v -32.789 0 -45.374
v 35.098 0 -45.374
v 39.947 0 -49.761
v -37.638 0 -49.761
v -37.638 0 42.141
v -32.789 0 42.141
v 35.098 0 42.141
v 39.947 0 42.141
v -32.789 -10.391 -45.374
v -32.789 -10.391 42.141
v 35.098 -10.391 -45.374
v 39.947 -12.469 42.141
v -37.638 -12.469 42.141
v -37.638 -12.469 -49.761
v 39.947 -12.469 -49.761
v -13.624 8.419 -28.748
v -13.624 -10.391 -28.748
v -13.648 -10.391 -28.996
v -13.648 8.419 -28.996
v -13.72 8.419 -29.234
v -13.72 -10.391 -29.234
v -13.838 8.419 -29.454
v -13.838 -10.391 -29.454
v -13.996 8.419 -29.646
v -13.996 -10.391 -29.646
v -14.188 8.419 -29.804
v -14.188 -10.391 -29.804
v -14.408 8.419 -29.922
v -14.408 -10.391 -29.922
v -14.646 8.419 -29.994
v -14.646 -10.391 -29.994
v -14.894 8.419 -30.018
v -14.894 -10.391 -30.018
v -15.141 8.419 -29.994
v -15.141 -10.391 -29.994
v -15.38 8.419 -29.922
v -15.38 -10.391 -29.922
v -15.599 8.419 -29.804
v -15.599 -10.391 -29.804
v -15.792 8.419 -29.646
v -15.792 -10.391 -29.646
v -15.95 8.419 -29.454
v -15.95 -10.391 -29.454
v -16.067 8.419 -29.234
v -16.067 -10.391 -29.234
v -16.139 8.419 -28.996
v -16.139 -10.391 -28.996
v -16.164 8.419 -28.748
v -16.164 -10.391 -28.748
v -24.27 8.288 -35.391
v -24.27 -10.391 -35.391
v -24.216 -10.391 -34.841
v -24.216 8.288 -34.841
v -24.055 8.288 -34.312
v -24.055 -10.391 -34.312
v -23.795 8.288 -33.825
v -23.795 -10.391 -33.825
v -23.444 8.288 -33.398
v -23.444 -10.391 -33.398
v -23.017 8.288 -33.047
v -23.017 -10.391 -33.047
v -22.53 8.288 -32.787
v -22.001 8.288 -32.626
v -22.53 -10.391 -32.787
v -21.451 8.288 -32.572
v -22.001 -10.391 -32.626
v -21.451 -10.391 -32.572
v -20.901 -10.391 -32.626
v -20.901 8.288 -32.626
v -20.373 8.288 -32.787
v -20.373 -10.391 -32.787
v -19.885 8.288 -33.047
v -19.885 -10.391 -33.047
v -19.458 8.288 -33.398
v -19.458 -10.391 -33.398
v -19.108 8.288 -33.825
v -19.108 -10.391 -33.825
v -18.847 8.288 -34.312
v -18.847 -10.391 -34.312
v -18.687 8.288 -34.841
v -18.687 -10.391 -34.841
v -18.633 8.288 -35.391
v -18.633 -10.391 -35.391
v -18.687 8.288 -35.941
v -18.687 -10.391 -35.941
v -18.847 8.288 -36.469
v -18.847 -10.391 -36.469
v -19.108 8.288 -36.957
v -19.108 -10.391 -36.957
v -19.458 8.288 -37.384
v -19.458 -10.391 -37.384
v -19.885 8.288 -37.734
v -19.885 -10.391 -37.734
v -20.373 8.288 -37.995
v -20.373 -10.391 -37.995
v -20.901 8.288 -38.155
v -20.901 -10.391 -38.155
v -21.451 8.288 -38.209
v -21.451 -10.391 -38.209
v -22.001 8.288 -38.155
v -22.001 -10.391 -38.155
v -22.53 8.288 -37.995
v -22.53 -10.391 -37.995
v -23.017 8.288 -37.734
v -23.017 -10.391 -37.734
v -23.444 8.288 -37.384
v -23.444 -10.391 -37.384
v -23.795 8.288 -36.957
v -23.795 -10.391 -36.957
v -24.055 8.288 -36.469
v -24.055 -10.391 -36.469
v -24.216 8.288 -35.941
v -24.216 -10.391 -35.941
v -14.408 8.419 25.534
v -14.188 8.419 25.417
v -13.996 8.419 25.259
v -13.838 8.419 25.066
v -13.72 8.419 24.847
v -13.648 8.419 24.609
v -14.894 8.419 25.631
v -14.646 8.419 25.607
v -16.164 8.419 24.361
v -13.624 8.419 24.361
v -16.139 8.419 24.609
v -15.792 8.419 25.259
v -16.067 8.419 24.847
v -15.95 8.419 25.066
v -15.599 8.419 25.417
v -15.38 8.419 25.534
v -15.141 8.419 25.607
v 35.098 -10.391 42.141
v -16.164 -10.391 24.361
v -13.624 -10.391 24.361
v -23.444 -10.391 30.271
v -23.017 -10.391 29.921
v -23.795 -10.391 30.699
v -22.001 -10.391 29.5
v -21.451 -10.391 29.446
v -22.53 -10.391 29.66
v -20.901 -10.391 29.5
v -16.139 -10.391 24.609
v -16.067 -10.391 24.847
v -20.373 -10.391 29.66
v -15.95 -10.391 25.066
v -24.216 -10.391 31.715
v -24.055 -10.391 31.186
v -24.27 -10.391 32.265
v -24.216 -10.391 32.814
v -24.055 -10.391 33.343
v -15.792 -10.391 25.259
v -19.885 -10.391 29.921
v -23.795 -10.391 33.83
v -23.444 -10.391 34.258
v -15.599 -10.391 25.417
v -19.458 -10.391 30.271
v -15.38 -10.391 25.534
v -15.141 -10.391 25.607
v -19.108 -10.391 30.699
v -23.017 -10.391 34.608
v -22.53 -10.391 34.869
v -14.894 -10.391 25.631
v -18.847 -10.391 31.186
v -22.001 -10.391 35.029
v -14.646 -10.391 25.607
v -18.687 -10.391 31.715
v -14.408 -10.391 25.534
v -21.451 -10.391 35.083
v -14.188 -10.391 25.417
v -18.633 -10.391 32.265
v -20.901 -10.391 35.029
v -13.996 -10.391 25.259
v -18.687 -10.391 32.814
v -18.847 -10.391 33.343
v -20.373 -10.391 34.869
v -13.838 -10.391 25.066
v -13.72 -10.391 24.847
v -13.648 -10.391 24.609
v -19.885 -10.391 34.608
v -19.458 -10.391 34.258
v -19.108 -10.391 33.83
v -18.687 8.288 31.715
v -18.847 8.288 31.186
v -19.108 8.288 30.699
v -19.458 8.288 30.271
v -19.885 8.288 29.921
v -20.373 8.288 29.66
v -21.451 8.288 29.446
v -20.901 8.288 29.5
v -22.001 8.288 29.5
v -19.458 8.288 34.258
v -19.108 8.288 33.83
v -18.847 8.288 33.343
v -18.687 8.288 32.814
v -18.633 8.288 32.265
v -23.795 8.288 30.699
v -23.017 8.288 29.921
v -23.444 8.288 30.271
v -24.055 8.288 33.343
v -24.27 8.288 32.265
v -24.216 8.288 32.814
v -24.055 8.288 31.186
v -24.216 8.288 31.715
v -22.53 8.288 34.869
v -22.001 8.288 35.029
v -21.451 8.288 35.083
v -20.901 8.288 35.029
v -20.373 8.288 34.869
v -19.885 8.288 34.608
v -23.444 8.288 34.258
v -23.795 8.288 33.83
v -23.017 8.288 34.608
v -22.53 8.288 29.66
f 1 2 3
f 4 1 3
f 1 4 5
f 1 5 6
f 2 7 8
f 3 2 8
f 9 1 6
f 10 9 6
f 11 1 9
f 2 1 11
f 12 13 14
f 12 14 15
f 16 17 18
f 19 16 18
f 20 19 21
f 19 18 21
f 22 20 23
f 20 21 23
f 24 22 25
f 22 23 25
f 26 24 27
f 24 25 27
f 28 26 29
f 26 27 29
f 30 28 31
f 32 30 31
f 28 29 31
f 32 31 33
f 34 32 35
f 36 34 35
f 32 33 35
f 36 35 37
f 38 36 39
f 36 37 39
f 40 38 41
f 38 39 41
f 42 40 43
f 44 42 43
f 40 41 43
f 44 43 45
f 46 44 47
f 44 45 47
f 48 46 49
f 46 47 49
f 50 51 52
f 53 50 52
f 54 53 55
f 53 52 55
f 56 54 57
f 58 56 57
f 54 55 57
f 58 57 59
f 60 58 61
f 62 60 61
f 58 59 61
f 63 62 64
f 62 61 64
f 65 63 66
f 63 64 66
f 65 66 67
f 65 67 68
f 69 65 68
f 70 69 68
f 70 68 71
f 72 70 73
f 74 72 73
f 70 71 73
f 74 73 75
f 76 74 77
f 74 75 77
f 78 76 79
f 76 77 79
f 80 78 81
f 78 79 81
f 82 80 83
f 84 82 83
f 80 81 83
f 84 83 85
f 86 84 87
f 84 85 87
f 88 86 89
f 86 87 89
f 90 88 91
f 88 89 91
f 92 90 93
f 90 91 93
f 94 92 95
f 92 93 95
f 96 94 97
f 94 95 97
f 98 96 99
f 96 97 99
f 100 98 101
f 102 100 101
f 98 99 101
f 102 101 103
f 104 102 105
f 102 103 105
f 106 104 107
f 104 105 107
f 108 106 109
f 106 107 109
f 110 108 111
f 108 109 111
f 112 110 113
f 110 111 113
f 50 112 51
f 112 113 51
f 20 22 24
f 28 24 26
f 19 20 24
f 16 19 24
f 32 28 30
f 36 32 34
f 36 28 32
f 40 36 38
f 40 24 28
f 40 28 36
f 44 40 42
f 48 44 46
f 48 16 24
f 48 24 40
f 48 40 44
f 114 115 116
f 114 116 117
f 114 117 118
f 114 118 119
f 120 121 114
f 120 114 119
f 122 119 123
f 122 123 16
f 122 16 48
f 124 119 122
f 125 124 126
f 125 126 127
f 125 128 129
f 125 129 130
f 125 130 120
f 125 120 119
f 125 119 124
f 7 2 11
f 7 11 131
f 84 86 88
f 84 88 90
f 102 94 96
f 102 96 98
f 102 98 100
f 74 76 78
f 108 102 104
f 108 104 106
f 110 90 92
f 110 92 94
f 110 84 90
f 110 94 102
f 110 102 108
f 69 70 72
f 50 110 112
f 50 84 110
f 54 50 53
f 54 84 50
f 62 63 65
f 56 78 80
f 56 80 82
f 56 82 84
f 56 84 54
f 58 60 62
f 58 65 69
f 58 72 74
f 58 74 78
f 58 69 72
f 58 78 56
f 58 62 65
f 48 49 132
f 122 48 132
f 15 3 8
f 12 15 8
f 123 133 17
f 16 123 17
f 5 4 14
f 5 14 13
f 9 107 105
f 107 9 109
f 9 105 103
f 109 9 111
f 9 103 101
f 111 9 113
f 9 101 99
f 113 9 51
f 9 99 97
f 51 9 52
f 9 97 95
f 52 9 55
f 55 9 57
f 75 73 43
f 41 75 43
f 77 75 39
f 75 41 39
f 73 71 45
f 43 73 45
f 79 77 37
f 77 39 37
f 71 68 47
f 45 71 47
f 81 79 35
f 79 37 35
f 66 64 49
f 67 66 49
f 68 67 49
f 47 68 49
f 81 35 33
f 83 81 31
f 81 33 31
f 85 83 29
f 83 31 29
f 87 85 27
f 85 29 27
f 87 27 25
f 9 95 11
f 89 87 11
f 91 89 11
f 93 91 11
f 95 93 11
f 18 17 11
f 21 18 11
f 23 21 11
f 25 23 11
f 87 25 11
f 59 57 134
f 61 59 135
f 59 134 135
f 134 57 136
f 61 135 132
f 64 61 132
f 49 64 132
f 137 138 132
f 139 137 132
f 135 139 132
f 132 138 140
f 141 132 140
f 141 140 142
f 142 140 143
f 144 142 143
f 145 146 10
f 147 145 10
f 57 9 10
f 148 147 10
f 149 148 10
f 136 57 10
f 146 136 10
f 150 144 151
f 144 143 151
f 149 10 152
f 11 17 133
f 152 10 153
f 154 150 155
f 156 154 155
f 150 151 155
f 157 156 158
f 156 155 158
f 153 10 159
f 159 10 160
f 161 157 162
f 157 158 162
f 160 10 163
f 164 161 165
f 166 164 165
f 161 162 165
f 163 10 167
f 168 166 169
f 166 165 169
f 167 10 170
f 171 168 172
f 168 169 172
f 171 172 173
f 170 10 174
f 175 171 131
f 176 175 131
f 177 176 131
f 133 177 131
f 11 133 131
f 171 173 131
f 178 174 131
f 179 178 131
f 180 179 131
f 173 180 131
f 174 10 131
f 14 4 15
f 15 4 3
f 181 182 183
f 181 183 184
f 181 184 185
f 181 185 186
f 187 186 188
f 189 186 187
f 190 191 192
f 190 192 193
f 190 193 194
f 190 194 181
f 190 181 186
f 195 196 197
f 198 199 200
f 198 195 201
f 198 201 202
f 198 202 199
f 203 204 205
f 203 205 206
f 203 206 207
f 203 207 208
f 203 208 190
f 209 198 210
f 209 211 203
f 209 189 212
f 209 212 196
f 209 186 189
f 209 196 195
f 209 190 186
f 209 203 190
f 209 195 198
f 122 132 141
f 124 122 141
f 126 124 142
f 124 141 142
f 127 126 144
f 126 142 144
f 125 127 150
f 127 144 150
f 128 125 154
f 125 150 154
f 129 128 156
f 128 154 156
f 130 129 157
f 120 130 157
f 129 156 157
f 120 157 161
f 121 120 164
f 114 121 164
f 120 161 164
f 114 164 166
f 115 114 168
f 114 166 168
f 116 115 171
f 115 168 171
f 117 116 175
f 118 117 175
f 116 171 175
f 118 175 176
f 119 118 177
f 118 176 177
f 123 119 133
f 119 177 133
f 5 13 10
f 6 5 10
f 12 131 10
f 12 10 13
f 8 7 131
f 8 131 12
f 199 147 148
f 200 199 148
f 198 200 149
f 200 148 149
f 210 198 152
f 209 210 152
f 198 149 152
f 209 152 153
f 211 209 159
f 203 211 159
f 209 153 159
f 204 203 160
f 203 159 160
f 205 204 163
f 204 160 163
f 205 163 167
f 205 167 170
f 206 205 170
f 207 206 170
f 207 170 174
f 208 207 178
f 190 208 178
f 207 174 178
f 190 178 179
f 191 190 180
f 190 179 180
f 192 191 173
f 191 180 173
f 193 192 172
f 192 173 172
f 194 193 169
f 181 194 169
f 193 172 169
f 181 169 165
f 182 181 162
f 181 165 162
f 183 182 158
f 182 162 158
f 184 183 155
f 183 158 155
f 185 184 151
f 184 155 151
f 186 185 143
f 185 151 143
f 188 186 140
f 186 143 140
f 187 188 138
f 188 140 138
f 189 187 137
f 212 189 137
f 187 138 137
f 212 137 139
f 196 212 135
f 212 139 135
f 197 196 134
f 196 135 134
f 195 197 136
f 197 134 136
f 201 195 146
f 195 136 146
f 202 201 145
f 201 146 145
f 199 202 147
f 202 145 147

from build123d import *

# Parameters (mm, degrees)
F0_W     = 77.585459
F0_H     = 91.901824
F1_DEPTH = 12.46909
F2_W     = 67.887273
F2_H     = 91.439999
F3_DEPTH = 10.39091
F4_R     = 2.818603
F5_DEPTH = 18.67939
F7_DEPTH = 18.80963


with BuildPart() as f1:
    # F0 (on Front) → F1 (new body)
    with BuildSketch(Plane.XZ):
        with Locations((1.154546, -3.81)):
            Rectangle(F0_W, F0_H)
    extrude(amount=F1_DEPTH)

    # F2 (on Front) → F3 (cut)
    with BuildSketch(Plane.XZ):
        with Locations((1.154547, 0.346363)):
            Rectangle(F2_W, F2_H)
    extrude(amount=F3_DEPTH, mode=Mode.SUBTRACT)

    # F4 (on face) → F5 (join)
    with BuildSketch(Plane(origin=(0, -10.39091, 0), x_dir=(-1, 0, 0), z_dir=(0, 1, 0))):
        with Locations((21.451365, 32.264516)):
            Circle(F4_R)
        with Locations((21.451365, -35.390843)):
            Circle(F4_R)
    extrude(amount=F5_DEPTH)

    # F6 (on face) → F7 (join)
    with BuildSketch(Plane(origin=(0, -10.39091, 0), x_dir=(-1, 0, 0), z_dir=(0, 1, 0))):
        with BuildLine():
            ThreePointArc((16.163638, 24.36091), (14.893637, 25.630911), (13.623635, 24.36091))
            Line((13.623635, 24.36091), (13.623635, -28.748181))
            ThreePointArc((13.623635, -28.748181), (14.893637, -30.018182), (16.163638, -28.748181))
            Line((16.163638, -28.748181), (16.163638, 24.36091))
        make_face()
    extrude(amount=F7_DEPTH)


solid = f1.part
